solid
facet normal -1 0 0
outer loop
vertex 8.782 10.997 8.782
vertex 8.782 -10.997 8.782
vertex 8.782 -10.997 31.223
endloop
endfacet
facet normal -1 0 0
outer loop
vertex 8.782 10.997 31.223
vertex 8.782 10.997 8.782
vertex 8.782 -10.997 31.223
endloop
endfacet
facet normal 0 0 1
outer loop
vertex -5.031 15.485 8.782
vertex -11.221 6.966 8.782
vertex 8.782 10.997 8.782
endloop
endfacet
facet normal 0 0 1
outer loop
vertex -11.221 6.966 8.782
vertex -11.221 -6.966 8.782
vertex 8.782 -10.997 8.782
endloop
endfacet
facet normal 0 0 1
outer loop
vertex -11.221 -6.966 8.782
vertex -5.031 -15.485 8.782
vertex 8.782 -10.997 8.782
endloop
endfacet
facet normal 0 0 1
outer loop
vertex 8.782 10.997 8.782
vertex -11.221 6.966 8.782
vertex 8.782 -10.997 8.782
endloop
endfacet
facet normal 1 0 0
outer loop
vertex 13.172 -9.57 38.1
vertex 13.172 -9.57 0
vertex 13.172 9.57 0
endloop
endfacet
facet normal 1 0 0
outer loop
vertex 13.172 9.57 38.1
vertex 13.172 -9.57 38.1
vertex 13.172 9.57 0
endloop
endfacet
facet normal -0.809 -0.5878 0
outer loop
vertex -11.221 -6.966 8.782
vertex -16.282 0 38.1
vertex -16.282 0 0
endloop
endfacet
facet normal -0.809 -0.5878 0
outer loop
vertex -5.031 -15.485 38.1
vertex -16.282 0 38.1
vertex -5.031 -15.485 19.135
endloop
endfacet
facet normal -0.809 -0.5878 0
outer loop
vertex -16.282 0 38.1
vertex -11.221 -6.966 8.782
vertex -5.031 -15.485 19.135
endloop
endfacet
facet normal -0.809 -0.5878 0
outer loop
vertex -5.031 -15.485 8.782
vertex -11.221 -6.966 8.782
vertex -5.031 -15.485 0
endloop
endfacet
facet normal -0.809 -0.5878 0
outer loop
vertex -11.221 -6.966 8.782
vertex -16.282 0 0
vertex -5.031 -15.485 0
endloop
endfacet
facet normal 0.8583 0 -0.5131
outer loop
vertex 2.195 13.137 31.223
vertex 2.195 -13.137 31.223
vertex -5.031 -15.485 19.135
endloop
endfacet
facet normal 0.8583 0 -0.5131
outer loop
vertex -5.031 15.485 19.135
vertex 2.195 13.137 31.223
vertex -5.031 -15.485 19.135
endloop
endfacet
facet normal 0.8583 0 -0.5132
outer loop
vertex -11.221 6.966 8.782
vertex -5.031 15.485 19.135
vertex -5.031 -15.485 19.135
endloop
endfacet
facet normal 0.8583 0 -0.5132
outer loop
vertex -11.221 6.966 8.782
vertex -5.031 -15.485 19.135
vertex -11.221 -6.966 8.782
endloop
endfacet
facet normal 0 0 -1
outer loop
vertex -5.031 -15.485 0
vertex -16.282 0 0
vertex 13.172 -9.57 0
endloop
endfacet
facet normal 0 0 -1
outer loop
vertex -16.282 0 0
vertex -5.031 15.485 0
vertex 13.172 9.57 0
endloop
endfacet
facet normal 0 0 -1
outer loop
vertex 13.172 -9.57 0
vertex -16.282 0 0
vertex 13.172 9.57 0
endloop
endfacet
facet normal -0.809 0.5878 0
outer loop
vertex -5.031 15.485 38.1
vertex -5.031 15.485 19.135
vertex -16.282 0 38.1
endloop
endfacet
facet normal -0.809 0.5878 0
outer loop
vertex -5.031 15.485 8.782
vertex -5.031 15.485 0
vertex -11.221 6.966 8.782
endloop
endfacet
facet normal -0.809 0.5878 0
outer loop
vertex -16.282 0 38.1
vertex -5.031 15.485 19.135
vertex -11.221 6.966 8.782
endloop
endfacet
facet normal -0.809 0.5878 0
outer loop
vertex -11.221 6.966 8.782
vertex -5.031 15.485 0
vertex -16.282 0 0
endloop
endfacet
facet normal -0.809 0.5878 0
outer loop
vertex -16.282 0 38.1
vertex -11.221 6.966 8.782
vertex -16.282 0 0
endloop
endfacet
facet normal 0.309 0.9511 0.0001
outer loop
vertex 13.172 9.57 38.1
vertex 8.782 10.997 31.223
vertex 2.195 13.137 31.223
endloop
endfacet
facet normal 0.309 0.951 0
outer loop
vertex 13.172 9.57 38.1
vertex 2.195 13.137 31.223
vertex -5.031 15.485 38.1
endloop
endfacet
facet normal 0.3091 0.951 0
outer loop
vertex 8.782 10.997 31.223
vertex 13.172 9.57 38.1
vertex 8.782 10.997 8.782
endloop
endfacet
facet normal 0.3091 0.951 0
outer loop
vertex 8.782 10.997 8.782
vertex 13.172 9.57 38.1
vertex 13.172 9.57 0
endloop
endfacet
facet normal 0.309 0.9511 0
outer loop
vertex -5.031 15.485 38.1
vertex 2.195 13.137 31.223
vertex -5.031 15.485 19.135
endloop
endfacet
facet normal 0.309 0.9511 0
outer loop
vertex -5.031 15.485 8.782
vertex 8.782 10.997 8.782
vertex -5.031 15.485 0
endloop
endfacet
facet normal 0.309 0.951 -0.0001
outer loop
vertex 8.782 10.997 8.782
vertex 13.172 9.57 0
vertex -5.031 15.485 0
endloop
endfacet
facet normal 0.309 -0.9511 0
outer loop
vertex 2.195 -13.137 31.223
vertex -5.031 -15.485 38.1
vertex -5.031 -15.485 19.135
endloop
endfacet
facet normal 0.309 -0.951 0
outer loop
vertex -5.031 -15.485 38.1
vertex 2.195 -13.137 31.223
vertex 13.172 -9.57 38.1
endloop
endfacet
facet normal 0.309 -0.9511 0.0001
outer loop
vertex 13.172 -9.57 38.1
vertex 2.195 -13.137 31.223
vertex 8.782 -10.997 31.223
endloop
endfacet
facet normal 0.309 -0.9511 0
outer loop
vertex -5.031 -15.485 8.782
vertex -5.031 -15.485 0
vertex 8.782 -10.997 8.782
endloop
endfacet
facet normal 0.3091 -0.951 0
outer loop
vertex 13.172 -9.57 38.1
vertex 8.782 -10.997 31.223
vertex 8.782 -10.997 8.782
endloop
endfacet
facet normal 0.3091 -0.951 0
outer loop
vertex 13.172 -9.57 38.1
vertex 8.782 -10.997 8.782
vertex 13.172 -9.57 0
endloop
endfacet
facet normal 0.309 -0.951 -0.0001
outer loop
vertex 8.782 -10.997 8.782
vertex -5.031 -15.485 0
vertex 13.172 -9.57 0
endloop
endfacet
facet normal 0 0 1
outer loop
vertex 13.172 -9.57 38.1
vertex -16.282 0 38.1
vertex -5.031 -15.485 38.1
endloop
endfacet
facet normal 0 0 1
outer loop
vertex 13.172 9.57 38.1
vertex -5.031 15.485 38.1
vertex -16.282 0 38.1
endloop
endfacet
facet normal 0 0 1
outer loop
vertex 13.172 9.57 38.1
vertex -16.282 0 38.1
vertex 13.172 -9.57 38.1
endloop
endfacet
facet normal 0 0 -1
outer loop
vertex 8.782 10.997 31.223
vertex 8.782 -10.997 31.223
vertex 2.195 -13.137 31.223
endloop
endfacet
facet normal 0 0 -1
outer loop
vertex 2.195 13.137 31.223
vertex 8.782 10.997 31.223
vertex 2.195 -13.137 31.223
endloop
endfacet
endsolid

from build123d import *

# Parameters (mm, degrees)
F1_DEPTH = 38.1
F3_DEPTH = 27.686


with BuildPart() as f1:
    # F0 (on Top) → F1 (new body)
    with BuildSketch(Plane.XY):
        Polygon((13.172377, -9.570292), (13.172377, 9.570292), (-5.0314, 15.485058), (-16.281953, 0), (-5.0314, -15.485058), align=None)
    extrude(amount=F1_DEPTH)

    # F2 (on Front) → F3 (cut, symmetric)
    with BuildSketch(Plane.XZ):
        Polygon((8.781587, 31.223414), (2.195396, 31.223414), (-11.220914, 8.781586), (8.781587, 8.781586), align=None)
    extrude(amount=F3_DEPTH, both=True, mode=Mode.SUBTRACT)


solid = f1.part
